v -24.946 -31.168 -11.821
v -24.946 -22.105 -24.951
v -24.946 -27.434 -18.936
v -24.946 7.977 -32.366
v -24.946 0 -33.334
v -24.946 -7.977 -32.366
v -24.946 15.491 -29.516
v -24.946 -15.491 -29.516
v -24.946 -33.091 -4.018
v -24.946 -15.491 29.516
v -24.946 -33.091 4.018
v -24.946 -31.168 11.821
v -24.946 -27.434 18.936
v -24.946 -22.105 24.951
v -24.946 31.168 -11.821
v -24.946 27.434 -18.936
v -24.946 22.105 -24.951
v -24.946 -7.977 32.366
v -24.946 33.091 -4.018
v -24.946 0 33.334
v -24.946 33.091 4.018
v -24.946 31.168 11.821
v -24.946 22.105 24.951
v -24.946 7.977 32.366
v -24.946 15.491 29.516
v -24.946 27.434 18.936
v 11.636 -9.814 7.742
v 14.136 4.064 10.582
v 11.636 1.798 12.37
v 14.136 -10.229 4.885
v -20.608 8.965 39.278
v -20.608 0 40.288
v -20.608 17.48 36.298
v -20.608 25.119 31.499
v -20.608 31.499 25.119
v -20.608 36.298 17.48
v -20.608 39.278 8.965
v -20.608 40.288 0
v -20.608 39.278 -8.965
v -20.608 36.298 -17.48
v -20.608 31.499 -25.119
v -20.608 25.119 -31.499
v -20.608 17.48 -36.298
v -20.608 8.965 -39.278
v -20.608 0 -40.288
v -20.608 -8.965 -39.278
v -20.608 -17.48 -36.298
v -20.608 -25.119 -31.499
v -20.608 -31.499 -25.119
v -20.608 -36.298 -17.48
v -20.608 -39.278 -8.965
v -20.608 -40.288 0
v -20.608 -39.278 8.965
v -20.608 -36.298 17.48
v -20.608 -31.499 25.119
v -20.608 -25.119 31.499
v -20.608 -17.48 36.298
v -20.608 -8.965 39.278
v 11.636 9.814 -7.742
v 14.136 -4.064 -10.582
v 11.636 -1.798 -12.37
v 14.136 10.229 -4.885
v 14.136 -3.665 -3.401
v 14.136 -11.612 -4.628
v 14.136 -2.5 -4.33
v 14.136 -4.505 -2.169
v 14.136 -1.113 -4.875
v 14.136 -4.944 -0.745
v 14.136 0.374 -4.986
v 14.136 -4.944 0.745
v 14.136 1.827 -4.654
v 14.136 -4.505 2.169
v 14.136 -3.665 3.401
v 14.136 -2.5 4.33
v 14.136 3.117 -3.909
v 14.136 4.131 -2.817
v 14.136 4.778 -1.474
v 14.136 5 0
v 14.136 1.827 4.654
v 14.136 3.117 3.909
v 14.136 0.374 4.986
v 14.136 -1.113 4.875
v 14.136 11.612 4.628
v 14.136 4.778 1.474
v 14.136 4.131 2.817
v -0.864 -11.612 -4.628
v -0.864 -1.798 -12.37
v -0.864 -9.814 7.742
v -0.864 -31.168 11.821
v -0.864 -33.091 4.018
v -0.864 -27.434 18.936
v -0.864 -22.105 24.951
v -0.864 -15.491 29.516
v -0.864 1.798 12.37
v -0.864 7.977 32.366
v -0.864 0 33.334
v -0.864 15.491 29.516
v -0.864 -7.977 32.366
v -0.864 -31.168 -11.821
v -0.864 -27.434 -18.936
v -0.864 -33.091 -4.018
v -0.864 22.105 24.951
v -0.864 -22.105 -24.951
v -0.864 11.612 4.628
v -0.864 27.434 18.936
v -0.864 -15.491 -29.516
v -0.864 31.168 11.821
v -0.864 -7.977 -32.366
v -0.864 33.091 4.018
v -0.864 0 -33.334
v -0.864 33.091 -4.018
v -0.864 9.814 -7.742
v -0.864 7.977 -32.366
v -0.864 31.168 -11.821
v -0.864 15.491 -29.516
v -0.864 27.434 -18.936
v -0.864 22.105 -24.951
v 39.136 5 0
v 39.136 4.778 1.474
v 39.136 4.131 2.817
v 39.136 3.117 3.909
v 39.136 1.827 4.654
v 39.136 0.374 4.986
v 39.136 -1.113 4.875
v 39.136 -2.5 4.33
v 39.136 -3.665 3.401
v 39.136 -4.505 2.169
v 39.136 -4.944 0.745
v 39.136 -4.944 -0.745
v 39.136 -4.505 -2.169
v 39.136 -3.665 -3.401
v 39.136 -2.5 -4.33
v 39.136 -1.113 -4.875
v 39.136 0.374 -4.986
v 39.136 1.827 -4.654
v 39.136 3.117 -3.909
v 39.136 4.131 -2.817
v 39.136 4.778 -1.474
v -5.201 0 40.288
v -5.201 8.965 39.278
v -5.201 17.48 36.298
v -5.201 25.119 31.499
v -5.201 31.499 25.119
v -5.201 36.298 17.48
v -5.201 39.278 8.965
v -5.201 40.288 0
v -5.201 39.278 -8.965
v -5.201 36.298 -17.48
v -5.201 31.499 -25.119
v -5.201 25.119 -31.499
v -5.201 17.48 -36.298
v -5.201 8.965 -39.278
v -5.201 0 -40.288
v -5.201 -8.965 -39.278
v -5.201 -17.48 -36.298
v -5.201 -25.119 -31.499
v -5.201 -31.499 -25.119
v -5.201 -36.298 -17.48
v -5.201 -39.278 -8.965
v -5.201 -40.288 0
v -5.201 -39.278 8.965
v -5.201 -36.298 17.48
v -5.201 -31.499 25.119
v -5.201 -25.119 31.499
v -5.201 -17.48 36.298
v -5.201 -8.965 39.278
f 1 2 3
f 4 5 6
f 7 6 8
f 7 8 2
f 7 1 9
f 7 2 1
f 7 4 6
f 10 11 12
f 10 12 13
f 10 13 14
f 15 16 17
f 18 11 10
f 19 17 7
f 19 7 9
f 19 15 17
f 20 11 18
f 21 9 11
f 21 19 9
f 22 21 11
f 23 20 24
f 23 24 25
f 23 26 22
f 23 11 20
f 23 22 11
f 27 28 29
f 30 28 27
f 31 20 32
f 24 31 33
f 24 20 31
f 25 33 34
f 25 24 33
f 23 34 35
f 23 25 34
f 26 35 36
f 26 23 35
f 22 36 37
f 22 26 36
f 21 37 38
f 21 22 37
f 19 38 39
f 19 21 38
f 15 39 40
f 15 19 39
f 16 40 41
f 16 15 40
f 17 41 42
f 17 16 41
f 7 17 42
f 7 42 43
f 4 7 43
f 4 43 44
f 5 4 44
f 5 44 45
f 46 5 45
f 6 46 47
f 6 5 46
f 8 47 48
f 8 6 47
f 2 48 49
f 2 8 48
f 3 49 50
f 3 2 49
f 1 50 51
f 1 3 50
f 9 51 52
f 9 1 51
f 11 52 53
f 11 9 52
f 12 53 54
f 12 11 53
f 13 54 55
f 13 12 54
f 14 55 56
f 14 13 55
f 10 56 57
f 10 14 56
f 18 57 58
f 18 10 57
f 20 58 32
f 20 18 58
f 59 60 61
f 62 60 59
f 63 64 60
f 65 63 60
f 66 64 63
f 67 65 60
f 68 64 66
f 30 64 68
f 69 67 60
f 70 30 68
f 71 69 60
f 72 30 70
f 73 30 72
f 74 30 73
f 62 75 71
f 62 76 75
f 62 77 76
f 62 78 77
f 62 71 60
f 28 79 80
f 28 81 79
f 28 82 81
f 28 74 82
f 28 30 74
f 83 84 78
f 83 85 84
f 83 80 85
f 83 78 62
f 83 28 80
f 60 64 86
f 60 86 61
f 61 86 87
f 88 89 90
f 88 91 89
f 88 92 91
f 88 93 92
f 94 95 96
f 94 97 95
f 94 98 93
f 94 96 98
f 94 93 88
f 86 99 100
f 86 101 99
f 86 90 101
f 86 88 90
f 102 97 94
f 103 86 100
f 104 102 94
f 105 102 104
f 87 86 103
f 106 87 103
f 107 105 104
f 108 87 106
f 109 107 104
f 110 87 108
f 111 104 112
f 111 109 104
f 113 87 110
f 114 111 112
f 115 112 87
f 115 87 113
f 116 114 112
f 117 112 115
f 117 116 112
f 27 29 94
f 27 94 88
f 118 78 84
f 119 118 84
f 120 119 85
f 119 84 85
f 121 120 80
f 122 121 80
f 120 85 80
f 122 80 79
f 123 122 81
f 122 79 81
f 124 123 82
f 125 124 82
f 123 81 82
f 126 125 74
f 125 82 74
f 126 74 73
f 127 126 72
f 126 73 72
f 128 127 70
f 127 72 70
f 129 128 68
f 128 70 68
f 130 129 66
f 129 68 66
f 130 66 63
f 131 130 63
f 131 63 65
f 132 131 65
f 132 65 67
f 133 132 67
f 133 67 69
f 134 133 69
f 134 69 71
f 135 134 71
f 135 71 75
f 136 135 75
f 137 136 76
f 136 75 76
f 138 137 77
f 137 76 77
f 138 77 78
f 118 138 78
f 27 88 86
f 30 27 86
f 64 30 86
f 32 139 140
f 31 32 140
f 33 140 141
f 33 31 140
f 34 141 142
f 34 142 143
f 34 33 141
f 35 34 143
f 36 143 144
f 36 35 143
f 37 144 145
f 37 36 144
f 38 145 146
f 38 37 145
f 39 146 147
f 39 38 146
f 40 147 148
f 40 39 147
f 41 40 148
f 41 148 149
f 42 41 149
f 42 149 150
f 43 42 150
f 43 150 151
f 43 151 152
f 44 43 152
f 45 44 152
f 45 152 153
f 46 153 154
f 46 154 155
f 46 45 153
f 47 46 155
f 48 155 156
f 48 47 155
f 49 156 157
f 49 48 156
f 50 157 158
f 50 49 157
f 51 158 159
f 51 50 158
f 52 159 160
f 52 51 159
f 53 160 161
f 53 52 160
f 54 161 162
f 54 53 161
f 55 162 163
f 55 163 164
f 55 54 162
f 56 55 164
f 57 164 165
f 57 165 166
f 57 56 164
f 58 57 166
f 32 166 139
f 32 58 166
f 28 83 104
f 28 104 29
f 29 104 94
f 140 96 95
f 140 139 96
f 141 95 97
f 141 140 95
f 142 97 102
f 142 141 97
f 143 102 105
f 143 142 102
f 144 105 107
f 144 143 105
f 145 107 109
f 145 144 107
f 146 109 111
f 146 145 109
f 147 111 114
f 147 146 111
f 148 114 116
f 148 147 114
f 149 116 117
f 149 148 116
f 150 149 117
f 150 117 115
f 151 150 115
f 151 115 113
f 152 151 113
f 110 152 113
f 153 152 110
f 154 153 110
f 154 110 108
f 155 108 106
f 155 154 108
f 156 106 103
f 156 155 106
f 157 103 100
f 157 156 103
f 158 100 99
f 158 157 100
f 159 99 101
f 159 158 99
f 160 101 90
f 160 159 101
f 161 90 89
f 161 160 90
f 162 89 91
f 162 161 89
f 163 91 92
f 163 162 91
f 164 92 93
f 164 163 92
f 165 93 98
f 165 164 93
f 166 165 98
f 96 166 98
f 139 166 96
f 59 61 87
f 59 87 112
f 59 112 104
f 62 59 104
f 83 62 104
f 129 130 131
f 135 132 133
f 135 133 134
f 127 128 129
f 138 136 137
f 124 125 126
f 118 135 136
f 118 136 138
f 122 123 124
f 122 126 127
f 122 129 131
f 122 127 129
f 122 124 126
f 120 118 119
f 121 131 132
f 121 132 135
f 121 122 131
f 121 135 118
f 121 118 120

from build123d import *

# Parameters (mm, degrees)
F3_DEPTH = 15
F4_R     = 5
F5_DEPTH = 25
F6_SIZE  = 2.5


with BuildPart() as f1:
    # F0 (on Front) → F1 (revolve)
    with BuildSketch(Plane.XZ):
        Polygon((-24.945579, 0), (-0.863729, 0), (-0.863729, 33.33446), (-5.200911, 40.288184), (-20.608397, 40.288184), (-24.945579, 33.33446), align=None)
    revolve(axis=Axis((-33.212595, 0, 0), (-1, 0, 0)))

    # F2 (on face) → F3 (join)
    with BuildSketch(Plane.YZ.offset(-0.863729)):
        Polygon((9.813965, -7.74184), (11.611613, 4.628223), (1.797647, 12.370063), (-9.813965, 7.74184), (-11.611613, -4.628223), (-1.797647, -12.370063), align=None)
    extrude(amount=F3_DEPTH)

    # F4 (on face) → F5 (join)
    with BuildSketch(Plane.YZ.offset(14.136271)):
        Circle(F4_R)
    extrude(amount=F5_DEPTH)

    # F6
    f6_edges = [f1.edges().sort_by_distance(p)[0] for p in [
        (14.136271, 4.008159, -10.055952),
        (14.136271, -4.008159, 10.055952),
    ]]
    chamfer(f6_edges, length=F6_SIZE)


solid = f1.part
